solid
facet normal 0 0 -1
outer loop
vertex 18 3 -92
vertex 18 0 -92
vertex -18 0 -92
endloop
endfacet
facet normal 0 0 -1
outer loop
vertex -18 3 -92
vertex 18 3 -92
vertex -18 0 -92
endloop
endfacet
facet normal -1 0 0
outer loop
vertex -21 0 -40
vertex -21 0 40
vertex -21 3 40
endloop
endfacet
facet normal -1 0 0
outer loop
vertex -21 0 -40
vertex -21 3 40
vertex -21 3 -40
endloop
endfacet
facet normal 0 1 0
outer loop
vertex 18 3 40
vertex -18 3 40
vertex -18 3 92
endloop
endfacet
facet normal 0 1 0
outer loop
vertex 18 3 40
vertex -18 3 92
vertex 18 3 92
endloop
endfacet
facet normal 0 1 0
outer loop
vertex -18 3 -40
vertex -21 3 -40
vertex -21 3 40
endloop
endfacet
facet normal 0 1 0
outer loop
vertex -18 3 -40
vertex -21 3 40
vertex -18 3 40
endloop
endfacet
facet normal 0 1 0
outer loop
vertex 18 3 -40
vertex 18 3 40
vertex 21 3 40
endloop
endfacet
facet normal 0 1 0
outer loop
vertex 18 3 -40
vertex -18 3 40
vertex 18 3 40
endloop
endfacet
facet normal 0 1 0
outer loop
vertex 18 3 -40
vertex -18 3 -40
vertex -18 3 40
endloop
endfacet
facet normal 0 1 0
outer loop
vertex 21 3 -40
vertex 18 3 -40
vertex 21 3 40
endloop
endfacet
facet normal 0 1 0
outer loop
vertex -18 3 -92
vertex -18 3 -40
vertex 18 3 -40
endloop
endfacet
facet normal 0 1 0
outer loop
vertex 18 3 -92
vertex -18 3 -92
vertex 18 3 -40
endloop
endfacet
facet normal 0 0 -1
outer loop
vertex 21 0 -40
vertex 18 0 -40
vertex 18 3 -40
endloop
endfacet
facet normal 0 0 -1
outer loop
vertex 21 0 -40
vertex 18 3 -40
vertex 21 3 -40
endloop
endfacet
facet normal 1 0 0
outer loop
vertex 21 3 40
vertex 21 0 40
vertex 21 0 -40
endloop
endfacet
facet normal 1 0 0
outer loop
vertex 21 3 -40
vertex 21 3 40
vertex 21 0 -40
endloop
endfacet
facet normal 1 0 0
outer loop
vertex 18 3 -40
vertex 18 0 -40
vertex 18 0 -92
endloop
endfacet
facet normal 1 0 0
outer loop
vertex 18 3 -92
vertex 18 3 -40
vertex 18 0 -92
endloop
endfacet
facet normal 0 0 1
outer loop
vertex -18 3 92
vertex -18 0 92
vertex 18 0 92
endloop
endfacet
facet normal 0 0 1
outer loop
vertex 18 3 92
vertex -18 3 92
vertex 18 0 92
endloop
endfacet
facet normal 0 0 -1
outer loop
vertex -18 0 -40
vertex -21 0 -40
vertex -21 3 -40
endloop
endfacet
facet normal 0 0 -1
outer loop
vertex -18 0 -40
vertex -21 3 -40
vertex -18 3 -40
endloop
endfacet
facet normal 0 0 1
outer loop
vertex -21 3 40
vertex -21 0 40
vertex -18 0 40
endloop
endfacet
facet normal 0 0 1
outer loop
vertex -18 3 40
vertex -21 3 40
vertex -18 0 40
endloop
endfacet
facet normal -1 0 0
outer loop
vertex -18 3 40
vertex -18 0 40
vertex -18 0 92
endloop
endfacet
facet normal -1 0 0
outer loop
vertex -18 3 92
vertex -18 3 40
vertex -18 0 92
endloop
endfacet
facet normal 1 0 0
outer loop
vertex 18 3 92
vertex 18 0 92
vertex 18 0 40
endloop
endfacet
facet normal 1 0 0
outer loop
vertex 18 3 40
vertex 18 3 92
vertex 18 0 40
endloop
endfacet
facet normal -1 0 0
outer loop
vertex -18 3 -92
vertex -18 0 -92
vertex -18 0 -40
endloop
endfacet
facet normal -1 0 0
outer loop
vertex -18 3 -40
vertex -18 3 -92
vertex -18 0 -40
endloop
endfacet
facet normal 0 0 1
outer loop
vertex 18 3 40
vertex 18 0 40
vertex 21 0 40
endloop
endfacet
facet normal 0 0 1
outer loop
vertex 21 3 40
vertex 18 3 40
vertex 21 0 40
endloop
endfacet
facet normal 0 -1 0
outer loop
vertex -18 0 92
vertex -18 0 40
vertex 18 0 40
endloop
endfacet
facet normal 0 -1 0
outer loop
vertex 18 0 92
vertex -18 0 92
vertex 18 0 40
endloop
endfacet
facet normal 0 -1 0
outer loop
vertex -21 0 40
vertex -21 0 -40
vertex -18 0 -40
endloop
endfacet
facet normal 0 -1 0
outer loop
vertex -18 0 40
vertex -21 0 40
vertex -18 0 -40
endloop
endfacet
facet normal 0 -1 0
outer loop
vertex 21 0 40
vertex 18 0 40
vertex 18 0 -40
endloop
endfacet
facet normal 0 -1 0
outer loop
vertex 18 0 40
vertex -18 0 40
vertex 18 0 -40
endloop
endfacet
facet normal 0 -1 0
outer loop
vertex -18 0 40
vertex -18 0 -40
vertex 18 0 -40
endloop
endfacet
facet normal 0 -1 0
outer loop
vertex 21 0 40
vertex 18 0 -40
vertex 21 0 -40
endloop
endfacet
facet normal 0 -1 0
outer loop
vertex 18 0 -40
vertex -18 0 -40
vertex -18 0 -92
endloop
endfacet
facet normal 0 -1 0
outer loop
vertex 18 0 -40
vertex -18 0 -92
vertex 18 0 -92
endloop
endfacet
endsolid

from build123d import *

# Parameters (mm, degrees)
SKETCH1_W           = 3
SKETCH1_H           = 80
BOSS_EXTRUDE1_DEPTH = 3


with BuildPart() as part:
    # Sketch1 → Boss-Extrude1 (new body)
    with BuildSketch(Plane(origin=(0, 0, 0), x_dir=(1, 0, 0), z_dir=(0, 1, 0))):
        Polygon((-18, -40), (-18, -92), (18, -92), (18, -40), (15, -40), (15, 40), (18, 40), (18, 92), (-18, 92), (-18, 40), (-15, 40), (-15, -40), align=None)
        with Locations((16.5, 0)):
            Rectangle(SKETCH1_W, SKETCH1_H)
        with Locations((19.5, 0)):
            Rectangle(SKETCH1_W, SKETCH1_H)
        with Locations((-19.5, 0)):
            Rectangle(SKETCH1_W, SKETCH1_H)
        with Locations((-16.5, 0)):
            Rectangle(SKETCH1_W, SKETCH1_H)
    extrude(amount=BOSS_EXTRUDE1_DEPTH)


solid = part.part
